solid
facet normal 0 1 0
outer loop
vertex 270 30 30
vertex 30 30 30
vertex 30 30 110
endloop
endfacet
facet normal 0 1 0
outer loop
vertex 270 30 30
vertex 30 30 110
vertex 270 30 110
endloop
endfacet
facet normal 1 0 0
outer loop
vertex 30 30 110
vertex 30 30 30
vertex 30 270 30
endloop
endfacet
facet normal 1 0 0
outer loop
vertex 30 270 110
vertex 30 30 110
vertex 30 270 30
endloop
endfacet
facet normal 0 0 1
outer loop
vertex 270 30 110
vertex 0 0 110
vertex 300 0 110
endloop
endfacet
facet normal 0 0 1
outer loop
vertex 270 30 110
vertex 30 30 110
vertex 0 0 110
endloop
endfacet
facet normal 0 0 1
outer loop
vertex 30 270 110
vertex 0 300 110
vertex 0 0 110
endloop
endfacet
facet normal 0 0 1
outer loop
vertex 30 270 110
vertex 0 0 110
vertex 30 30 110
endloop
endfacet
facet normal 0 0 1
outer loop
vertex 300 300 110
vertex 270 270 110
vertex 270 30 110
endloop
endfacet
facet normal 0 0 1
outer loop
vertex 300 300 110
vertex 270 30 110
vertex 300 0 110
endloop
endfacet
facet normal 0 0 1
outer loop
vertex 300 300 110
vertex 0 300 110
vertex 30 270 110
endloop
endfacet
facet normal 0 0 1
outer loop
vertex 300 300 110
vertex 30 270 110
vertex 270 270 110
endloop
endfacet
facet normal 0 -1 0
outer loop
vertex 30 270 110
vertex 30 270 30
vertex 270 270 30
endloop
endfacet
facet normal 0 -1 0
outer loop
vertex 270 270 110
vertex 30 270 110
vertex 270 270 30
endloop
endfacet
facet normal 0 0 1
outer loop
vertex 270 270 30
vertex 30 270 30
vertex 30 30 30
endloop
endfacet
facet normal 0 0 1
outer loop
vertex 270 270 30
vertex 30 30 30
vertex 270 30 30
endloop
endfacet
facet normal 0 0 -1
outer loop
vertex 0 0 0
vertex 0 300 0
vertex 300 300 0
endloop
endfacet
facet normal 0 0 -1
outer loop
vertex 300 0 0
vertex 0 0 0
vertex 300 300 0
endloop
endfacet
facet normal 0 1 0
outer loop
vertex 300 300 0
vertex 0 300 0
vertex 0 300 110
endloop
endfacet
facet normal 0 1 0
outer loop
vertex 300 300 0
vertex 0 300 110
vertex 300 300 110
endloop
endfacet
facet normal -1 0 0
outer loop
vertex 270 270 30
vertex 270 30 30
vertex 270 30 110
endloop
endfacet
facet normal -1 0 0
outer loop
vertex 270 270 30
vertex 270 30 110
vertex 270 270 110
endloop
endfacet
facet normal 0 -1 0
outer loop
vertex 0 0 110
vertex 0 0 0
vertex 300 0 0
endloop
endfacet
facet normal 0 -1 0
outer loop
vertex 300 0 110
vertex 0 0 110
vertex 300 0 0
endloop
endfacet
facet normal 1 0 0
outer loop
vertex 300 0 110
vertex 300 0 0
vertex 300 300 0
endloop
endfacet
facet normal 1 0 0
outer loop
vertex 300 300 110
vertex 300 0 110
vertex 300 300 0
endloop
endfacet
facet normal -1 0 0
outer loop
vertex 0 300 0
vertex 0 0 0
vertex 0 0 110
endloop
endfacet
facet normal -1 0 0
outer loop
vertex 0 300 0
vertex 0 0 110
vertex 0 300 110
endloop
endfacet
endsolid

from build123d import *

# Parameters (mm, degrees)
SKETCH_W      = 300
SKETCH_H      = 300
PAD_DEPTH     = 30
SKETCH001_W   = 300
SKETCH001_H   = 300
SKETCH001_W_2 = 240
SKETCH001_H_2 = 240
PAD001_DEPTH  = 80


with BuildPart() as body:
    # Sketch → Pad (new body)
    with BuildSketch(Plane.XY):
        with Locations((150, 150)):
            Rectangle(SKETCH_W, SKETCH_H)
    extrude(amount=PAD_DEPTH)


with BuildPart() as body001:
    # Sketch001 (on Face6 of Pad) → Pad001 (new body)
    with BuildSketch(Plane.XY.offset(30)):
        with Locations((150, 150)):
            Rectangle(SKETCH001_W, SKETCH001_H)
        with Locations((150, 150)):
            Rectangle(SKETCH001_W_2, SKETCH001_H_2, mode=Mode.SUBTRACT)
    extrude(amount=PAD001_DEPTH)

    # Boolean: union Body
    add(body.part)


solid = body001.part
